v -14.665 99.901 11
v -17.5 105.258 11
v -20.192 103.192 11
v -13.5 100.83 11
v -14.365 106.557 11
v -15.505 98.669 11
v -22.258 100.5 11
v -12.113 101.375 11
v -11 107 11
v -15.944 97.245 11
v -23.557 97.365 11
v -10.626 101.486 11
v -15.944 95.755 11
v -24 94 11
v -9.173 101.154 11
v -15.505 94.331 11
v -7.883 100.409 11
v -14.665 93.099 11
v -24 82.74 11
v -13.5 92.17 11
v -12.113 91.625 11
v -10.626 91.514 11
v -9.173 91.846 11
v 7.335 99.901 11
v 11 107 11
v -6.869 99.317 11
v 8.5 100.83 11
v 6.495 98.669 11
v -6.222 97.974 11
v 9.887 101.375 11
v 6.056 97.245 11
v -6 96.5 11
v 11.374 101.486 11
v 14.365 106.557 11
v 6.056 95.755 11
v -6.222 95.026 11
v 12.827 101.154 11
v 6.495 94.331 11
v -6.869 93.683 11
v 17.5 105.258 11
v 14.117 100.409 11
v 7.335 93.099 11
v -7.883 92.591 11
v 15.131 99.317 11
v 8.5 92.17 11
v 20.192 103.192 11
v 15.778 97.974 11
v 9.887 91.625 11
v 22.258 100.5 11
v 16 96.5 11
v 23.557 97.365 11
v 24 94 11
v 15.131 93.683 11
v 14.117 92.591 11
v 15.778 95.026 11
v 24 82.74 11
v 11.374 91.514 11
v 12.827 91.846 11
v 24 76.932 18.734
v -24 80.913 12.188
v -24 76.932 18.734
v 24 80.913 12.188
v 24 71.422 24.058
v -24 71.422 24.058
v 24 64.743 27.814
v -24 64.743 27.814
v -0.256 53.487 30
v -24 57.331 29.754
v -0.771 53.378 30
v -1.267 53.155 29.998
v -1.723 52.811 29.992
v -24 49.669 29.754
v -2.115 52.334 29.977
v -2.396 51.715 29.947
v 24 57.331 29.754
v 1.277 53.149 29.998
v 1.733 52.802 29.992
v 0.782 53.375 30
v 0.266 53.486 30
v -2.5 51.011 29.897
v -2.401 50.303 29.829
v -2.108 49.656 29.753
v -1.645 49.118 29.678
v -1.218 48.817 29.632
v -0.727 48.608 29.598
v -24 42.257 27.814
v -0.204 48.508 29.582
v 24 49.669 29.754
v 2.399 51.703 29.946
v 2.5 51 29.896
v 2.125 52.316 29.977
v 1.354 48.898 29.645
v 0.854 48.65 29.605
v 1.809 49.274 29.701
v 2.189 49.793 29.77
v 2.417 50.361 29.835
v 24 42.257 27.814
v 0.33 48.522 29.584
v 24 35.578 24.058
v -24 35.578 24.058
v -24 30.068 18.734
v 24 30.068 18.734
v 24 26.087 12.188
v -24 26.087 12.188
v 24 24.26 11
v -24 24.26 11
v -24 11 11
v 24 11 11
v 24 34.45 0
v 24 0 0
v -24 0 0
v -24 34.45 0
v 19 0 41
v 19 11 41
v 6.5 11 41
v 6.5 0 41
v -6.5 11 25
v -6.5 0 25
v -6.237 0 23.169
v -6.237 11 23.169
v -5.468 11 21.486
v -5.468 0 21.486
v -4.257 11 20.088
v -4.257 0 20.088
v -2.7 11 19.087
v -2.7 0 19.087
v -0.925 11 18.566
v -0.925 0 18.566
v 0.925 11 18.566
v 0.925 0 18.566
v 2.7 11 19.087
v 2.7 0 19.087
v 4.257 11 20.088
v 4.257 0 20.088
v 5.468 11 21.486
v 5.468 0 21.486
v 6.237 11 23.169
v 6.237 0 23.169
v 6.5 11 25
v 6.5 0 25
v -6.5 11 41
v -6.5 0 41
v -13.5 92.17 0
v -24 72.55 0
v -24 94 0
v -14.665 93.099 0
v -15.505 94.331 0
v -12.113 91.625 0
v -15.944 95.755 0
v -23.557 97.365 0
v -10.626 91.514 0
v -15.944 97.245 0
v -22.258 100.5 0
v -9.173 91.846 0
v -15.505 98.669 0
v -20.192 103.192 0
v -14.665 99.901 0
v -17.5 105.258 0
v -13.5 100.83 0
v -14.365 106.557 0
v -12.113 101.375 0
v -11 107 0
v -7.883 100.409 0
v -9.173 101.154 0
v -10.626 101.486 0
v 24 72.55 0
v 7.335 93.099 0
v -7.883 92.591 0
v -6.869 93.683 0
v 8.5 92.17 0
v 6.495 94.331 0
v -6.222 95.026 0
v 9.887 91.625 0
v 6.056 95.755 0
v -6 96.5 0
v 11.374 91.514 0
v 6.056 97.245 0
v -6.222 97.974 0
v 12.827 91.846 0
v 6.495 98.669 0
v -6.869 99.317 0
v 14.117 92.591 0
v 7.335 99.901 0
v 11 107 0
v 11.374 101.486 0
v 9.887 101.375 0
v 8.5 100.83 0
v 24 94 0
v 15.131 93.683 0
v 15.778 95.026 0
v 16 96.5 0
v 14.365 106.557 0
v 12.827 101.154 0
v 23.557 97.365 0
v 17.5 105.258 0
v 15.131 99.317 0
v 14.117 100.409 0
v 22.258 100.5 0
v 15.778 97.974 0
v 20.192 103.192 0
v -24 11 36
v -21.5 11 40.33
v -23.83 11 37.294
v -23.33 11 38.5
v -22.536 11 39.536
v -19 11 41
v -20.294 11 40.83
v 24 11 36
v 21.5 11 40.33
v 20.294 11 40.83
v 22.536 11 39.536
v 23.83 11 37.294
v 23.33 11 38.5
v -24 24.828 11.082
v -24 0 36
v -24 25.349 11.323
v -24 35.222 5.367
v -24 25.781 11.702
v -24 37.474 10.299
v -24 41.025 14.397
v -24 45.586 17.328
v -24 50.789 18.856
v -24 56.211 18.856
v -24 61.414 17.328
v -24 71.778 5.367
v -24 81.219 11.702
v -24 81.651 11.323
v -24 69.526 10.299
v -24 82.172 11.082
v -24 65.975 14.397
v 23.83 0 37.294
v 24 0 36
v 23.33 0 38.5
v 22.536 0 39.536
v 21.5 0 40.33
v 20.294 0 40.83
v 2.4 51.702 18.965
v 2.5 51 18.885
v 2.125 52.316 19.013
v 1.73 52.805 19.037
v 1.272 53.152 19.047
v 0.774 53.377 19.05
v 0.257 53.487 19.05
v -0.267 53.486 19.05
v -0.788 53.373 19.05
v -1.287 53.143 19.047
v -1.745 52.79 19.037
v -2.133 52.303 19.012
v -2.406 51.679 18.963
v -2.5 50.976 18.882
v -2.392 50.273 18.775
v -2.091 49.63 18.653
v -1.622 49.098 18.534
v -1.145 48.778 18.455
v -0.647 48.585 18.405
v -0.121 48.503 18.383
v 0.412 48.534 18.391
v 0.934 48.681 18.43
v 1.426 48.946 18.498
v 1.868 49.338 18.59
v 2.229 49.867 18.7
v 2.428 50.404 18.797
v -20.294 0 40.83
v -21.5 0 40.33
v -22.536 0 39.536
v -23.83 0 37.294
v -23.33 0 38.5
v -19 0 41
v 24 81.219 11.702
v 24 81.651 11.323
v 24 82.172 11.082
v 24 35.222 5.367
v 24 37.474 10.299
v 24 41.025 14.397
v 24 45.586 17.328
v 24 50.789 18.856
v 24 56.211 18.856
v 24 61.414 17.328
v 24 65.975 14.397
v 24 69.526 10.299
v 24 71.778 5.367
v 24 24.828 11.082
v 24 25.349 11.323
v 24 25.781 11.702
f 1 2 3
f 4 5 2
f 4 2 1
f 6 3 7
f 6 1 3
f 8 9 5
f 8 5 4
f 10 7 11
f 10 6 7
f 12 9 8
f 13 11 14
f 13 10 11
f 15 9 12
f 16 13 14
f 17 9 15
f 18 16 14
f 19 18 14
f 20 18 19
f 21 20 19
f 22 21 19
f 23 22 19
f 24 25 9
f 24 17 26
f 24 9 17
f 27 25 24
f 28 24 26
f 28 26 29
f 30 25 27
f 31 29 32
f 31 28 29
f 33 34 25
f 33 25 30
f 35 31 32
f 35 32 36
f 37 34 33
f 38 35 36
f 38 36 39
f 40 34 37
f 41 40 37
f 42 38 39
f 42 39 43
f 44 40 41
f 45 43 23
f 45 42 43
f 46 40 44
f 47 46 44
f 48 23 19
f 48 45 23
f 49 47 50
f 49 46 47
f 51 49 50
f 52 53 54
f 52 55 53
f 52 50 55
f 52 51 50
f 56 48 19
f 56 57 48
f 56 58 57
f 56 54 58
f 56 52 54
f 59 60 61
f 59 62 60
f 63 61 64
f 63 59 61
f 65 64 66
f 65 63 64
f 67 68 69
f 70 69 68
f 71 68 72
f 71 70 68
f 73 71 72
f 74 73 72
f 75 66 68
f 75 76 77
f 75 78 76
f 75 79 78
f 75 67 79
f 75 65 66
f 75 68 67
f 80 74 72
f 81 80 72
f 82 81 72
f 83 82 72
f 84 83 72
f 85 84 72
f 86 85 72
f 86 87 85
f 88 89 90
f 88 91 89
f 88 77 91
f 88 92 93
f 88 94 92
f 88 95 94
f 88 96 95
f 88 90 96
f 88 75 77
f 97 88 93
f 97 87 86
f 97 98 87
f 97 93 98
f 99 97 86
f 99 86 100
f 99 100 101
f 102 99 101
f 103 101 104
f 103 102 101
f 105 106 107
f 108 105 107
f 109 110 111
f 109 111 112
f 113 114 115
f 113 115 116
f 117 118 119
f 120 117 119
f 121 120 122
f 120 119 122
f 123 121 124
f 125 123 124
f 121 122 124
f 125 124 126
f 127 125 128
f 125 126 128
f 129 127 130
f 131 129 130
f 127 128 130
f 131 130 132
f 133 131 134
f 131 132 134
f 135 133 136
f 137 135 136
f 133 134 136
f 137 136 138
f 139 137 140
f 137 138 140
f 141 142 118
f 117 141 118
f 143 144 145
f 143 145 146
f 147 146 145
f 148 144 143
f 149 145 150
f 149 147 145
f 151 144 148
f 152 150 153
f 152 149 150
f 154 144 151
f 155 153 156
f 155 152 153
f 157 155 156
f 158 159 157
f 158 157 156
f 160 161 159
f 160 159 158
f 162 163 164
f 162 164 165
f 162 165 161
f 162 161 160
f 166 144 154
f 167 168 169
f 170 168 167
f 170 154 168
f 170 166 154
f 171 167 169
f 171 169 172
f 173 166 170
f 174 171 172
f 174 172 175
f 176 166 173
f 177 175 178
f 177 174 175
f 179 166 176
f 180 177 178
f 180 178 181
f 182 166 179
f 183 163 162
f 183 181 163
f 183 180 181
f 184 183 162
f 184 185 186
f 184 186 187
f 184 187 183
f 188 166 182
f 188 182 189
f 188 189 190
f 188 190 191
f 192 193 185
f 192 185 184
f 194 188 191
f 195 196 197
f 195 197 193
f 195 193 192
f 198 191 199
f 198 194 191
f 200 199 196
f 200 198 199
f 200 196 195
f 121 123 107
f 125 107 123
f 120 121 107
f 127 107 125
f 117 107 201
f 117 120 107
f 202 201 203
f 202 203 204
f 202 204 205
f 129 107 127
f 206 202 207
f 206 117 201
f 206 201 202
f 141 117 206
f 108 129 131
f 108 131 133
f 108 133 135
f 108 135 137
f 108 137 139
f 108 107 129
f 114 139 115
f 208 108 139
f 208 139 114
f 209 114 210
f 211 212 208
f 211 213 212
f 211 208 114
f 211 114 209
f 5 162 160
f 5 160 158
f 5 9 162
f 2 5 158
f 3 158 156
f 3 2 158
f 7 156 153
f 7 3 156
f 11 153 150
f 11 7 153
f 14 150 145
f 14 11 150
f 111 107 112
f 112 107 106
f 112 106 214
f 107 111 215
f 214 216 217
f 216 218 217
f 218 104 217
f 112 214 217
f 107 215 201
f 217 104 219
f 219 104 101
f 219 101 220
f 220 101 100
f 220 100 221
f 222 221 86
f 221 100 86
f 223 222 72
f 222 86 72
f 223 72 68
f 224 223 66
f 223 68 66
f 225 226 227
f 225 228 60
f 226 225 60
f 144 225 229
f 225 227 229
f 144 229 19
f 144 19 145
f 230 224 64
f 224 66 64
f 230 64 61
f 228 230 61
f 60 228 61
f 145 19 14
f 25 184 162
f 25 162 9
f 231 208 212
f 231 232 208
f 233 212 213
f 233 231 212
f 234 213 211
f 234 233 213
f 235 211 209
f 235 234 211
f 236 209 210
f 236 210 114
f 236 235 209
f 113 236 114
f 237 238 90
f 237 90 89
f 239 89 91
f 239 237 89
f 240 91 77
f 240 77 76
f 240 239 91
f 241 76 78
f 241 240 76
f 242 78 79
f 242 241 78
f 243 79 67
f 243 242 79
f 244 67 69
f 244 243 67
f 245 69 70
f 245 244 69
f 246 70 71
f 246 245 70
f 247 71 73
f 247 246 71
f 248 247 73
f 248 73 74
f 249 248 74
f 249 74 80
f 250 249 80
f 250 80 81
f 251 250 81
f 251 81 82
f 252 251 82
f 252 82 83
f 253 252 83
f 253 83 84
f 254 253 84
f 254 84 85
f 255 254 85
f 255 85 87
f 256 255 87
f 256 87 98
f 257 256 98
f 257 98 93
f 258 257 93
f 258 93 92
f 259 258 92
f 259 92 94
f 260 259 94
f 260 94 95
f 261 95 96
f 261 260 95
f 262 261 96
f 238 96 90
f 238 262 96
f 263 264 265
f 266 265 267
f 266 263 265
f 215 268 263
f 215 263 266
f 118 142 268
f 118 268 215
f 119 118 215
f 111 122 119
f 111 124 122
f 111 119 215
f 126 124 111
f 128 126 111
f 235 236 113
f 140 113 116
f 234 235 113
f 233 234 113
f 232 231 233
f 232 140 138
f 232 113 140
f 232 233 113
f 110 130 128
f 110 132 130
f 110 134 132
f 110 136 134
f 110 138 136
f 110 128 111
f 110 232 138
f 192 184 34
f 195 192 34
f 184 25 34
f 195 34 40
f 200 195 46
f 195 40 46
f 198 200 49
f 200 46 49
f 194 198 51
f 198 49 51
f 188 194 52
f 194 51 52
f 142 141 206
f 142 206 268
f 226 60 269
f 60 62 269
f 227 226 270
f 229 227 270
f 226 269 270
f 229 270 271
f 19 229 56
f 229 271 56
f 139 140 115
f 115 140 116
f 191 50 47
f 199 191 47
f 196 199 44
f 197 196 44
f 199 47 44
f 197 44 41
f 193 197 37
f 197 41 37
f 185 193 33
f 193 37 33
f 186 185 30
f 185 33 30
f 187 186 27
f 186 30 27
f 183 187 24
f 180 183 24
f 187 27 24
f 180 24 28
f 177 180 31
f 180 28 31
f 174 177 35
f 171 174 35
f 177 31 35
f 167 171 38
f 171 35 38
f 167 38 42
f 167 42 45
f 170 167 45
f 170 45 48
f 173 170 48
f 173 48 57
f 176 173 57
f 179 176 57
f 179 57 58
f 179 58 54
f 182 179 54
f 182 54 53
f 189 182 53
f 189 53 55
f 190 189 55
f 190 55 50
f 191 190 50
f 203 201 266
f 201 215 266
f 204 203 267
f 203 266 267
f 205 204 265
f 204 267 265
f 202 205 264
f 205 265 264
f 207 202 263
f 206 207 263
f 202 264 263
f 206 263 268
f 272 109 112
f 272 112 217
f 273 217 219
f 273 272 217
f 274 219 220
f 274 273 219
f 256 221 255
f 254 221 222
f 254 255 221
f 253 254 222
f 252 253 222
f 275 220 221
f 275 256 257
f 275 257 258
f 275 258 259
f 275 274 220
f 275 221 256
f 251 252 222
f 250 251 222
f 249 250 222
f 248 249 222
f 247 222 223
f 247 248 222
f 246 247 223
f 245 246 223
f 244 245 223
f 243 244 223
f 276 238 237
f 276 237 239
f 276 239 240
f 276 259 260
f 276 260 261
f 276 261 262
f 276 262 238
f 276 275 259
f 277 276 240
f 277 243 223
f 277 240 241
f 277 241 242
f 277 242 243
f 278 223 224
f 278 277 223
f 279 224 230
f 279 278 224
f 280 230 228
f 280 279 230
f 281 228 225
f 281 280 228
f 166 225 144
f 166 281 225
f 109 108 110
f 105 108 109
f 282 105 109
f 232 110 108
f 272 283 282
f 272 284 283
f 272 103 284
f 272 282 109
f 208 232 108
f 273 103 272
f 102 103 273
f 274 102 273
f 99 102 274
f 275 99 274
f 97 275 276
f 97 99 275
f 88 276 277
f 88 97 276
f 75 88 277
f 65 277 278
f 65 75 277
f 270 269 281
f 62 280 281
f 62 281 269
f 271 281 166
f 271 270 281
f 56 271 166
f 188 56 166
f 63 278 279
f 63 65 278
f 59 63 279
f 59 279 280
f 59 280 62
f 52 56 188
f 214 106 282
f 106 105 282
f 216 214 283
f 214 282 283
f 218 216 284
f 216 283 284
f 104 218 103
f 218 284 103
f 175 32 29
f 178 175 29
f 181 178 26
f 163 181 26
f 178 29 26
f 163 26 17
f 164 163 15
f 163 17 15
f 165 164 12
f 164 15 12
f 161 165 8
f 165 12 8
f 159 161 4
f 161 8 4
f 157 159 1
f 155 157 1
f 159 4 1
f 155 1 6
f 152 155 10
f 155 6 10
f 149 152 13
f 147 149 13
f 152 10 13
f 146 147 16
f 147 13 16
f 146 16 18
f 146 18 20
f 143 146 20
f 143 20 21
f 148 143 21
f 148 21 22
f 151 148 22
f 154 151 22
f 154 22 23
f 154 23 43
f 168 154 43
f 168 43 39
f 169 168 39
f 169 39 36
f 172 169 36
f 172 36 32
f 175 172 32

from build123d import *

# Parameters (mm, degrees)
F1_DEPTH = 24
F2_R     = 13
F3_R     = 5
F5_DEPTH = 11
F6_R     = 2.5
F7_DEPTH = 41.001
F8_R     = 5
F9_DEPTH = 11.001
F10_R    = 2


with BuildPart() as f1:
    # F0 (on Right) → F1 (new body, symmetric)
    with BuildSketch(Plane.YZ):
        with BuildLine():
            Line((0, 41), (0, 0))
            Line((0, 0), (34.45, 0))
            ThreePointArc((34.45, 0), (53.5, 19.05), (72.55, 0))
            Line((72.55, 0), (107, 0))
            Line((107, 0), (107, 11))
            Line((107, 11), (81.410571, 11))
            ThreePointArc((81.410571, 11), (53.5, 30), (25.589429, 11))
            Line((25.589429, 11), (11, 11))
            Line((11, 11), (11, 41))
            Line((11, 41), (0, 41))
        make_face()
    extrude(amount=F1_DEPTH, both=True)

    # F2
    f2_edges = [f1.edges().sort_by_distance(p)[0] for p in [
        (24, 107, 5.5),
        (-24, 107, 5.5),
    ]]
    fillet(f2_edges, radius=F2_R)

    # F3
    f3_edges = [f1.edges().sort_by_distance(p)[0] for p in [
        (-24, 5.5, 41),
        (24, 5.5, 41),
    ]]
    fillet(f3_edges, radius=F3_R)

    # F4 (on face) → F5 (cut, through all)
    with BuildSketch(Plane.XZ):
        with BuildLine():
            Line((-6.5, 41), (-6.5, 25))
            ThreePointArc((-6.5, 25), (0, 18.5), (6.5, 25))
            Line((6.5, 25), (6.5, 41))
            Line((6.5, 41), (-6.5, 41))
        make_face()
    extrude(amount=-F5_DEPTH, mode=Mode.SUBTRACT)

    # F6 (on Top) → F7 (cut, through all)
    with BuildSketch(Plane.XY):
        with Locations((0, 51)):
            Circle(F6_R)
    extrude(amount=F7_DEPTH, mode=Mode.SUBTRACT)

    # F8 (on face) → F9 (cut, through all)
    with BuildSketch(Plane.XY.offset(11)):
        with Locations((-11, 96.5)):
            Circle(F8_R)
        with Locations((11, 96.5)):
            Circle(F8_R)
    extrude(amount=-F9_DEPTH, mode=Mode.SUBTRACT)

    # F10
    f10_edges = [f1.edges().sort_by_distance(p)[0] for p in [
        (0, 25.589429, 11),
        (0, 81.410571, 11),
    ]]
    fillet(f10_edges, radius=F10_R)


solid = f1.part
